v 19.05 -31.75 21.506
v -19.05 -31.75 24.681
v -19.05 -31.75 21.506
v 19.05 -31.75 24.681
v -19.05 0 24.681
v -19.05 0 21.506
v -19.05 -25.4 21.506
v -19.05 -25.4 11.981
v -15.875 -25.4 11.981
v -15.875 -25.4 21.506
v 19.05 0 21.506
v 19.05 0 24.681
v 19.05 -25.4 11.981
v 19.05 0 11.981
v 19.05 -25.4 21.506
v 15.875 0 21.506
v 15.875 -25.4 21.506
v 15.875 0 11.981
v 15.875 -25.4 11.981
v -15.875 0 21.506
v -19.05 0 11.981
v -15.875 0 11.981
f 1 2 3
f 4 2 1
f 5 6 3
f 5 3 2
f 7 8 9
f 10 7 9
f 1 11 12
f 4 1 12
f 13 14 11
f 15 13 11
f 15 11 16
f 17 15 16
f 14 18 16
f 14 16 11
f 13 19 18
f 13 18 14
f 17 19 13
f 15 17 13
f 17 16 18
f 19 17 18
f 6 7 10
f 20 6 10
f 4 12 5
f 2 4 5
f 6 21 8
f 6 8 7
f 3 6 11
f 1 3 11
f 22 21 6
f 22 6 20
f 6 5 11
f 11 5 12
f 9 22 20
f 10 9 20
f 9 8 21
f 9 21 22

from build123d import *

# Parameters (mm, degrees)
F0_W     = 3.175
F0_H     = 3.175
F0_W_2   = 31.7499573946
F0_W_3   = 3.1750426054
F1_DEPTH = 31.75
F0_H_2   = 9.525
F2_DEPTH = 25.4


# Not quite as in the source:
# - ends of sketch curves that miss each other by under 0.0002 mm in the source are joined


with BuildPart() as f1:
    # F0 (on Front) → F1 (new body)
    with BuildSketch(Plane.XZ):
        with Locations((-17.4625, 23.0930101633)):
            Rectangle(F0_W, F0_H)
        with Locations((-2.13027e-05, 23.0930101633)):
            Rectangle(F0_W_2, F0_H)
        with Locations((17.4624786973, 23.0930101633)):
            Rectangle(F0_W_3, F0_H)
    extrude(amount=F1_DEPTH)


with BuildPart() as f2:
    # F0 (on Front) → F2 (new body)
    with BuildSketch(Plane.XZ):
        with Locations((-17.4625, 16.7430101633)):
            Rectangle(F0_W, F0_H_2)
    extrude(amount=F2_DEPTH)


with BuildPart() as f2b:
    # F0 (on Front) → F2, piece 2 (new body)
    with BuildSketch(Plane.XZ):
        Polygon((19.05, 21.5055101633), (15.8749573946, 21.5055101633), (15.8749573946, 11.9805101633), (19.0499573946, 11.9805101633), align=None)
    extrude(amount=F2_DEPTH)


solid = Compound([f1.part, f2.part, f2b.part])
